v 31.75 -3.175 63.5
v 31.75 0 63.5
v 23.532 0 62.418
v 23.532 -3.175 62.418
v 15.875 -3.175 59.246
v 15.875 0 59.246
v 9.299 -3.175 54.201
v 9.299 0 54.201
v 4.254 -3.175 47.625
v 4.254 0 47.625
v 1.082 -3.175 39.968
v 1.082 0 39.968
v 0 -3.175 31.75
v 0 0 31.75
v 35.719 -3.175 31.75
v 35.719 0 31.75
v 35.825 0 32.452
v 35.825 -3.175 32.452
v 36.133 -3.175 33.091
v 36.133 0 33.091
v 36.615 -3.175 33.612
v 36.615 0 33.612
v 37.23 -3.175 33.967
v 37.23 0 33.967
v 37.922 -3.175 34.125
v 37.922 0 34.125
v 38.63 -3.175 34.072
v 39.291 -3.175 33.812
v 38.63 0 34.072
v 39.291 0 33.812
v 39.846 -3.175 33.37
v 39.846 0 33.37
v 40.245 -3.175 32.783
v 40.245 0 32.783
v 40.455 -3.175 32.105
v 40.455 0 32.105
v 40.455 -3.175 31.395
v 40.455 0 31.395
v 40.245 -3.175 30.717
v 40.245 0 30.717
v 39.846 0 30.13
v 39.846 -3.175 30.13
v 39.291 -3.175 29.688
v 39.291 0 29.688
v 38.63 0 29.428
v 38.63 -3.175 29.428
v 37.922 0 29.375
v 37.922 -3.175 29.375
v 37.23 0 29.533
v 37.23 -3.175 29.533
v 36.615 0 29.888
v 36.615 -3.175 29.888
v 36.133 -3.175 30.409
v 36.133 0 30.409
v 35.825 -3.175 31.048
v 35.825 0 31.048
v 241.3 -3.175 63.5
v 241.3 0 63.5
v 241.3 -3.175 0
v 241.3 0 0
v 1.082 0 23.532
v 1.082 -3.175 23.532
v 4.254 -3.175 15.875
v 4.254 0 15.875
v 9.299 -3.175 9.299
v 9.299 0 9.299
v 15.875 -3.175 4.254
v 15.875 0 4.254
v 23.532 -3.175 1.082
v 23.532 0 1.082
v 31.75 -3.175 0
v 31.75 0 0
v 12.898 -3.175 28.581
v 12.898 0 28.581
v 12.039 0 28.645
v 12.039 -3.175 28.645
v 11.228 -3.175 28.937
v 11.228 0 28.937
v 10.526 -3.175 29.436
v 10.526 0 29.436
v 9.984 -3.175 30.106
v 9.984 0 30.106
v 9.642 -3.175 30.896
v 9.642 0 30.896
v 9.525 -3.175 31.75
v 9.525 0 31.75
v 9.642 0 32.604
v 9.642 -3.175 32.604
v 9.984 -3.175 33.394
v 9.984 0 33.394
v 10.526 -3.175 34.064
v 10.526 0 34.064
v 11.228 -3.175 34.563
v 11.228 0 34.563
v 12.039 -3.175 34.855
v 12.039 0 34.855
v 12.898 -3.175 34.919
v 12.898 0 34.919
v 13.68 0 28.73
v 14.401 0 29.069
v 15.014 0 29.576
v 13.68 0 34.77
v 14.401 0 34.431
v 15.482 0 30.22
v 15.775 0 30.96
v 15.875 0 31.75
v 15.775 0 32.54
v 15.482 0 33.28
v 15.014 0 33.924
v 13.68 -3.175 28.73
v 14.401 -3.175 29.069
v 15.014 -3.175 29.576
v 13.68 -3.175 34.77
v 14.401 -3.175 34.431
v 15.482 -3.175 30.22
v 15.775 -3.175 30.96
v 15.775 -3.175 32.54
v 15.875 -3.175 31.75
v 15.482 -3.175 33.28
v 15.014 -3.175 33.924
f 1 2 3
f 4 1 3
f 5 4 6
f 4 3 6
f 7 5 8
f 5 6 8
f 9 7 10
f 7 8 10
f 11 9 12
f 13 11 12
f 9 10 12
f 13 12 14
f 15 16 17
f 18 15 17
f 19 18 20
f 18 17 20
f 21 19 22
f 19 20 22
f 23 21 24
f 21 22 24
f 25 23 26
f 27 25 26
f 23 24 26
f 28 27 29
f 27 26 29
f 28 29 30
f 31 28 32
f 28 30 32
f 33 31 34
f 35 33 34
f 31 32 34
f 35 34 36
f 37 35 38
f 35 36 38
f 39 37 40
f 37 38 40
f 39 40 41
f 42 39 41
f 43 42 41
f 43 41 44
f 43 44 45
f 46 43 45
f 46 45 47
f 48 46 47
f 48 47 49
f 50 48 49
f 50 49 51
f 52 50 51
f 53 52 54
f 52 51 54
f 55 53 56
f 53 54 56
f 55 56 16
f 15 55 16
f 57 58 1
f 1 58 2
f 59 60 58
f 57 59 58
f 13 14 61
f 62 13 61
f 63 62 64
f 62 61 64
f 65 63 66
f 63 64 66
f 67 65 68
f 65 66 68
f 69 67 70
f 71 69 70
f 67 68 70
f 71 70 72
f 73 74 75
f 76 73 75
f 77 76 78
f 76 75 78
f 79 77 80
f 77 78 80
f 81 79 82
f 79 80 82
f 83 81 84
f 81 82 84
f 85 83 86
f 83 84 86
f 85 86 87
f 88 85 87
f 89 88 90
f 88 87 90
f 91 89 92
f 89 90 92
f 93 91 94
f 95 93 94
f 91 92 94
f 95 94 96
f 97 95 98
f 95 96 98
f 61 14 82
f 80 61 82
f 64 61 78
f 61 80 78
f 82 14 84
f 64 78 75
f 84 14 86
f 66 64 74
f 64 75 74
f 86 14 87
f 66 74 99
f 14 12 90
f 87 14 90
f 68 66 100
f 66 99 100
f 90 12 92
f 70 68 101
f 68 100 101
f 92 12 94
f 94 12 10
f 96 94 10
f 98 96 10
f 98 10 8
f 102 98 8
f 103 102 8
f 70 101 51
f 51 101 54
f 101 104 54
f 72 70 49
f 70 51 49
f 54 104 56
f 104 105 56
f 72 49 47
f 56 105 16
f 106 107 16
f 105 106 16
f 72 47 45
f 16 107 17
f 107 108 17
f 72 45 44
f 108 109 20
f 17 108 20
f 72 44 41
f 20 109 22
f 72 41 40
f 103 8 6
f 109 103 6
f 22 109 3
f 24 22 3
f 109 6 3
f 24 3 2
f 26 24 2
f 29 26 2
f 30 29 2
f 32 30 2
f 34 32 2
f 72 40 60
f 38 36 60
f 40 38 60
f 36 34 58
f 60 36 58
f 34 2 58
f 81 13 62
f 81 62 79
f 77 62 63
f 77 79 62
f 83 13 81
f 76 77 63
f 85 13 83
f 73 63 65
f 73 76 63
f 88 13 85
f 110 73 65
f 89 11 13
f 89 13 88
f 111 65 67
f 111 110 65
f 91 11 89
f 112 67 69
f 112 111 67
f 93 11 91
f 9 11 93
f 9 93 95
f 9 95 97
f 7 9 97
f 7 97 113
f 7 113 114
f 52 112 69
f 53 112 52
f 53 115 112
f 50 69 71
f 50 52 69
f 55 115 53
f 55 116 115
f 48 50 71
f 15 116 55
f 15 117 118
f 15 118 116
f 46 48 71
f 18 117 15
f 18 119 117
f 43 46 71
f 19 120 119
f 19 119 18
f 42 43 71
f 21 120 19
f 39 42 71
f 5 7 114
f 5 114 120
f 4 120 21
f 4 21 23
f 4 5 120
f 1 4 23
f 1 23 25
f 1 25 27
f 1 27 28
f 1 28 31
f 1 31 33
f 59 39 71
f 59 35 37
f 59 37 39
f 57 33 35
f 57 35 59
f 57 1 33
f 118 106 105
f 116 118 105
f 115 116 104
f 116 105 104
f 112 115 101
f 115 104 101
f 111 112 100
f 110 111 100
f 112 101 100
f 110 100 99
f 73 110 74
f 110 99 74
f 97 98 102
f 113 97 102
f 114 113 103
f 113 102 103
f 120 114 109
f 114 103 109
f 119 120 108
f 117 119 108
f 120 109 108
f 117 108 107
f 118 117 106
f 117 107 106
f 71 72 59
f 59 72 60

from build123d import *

# Parameters (mm, degrees)
F1_DEPTH = 3.175


# Not quite as in the source:
# - a feature names something its author has since deleted; it is built from what else it names


with BuildPart() as f1:
    # F0 (on Front) → F1 (new body)
    with BuildSketch(Plane.XZ):
        with BuildLine():
            ThreePointArc((0, 31.75), (9.2993596973, 9.2993596973), (31.75, 0))
            Line((31.75, 0), (241.3, 0))
            Line((241.3, 0), (241.3, 63.5))
            Line((241.3, 63.5), (31.75, 63.5))
            ThreePointArc((31.75, 63.5), (9.2993596973, 54.2006403027), (0, 31.75))
        make_face()
        with BuildLine():
            ThreePointArc((12.8984375, 28.5812072396), (10.5262260999, 29.4358409667), (9.525, 31.75))
            ThreePointArc((9.525, 31.75), (10.5262260999, 34.0641590333), (12.8984375, 34.9187927604))
            ThreePointArc((12.8984375, 34.9187927604), (39.6875, 57.1003420835), (63.5, 31.75))
            ThreePointArc((63.5, 31.75), (39.6875, 6.3996579165), (12.8984375, 28.5812072396))
        make_face(mode=Mode.SUBTRACT)
        with BuildLine():
            ThreePointArc((63.5, 31.75), (39.6875, 57.1003420835), (12.8984375, 34.9187927604))
            ThreePointArc((12.8984375, 34.9187927604), (15.0141590333, 33.9237739001), (15.875, 31.75))
            ThreePointArc((15.875, 31.75), (15.0141590333, 29.5762260999), (12.8984375, 28.5812072396))
            ThreePointArc((12.8984375, 28.5812072396), (39.6875, 6.3996579165), (63.5, 31.75))
        make_face()
        with BuildLine():
            ThreePointArc((40.48125, 31.75), (38.1, 29.36875), (35.71875, 31.75))
            ThreePointArc((35.71875, 31.75), (38.1, 34.13125), (40.48125, 31.75))
        make_face(mode=Mode.SUBTRACT)
    extrude(amount=F1_DEPTH)


solid = f1.part
